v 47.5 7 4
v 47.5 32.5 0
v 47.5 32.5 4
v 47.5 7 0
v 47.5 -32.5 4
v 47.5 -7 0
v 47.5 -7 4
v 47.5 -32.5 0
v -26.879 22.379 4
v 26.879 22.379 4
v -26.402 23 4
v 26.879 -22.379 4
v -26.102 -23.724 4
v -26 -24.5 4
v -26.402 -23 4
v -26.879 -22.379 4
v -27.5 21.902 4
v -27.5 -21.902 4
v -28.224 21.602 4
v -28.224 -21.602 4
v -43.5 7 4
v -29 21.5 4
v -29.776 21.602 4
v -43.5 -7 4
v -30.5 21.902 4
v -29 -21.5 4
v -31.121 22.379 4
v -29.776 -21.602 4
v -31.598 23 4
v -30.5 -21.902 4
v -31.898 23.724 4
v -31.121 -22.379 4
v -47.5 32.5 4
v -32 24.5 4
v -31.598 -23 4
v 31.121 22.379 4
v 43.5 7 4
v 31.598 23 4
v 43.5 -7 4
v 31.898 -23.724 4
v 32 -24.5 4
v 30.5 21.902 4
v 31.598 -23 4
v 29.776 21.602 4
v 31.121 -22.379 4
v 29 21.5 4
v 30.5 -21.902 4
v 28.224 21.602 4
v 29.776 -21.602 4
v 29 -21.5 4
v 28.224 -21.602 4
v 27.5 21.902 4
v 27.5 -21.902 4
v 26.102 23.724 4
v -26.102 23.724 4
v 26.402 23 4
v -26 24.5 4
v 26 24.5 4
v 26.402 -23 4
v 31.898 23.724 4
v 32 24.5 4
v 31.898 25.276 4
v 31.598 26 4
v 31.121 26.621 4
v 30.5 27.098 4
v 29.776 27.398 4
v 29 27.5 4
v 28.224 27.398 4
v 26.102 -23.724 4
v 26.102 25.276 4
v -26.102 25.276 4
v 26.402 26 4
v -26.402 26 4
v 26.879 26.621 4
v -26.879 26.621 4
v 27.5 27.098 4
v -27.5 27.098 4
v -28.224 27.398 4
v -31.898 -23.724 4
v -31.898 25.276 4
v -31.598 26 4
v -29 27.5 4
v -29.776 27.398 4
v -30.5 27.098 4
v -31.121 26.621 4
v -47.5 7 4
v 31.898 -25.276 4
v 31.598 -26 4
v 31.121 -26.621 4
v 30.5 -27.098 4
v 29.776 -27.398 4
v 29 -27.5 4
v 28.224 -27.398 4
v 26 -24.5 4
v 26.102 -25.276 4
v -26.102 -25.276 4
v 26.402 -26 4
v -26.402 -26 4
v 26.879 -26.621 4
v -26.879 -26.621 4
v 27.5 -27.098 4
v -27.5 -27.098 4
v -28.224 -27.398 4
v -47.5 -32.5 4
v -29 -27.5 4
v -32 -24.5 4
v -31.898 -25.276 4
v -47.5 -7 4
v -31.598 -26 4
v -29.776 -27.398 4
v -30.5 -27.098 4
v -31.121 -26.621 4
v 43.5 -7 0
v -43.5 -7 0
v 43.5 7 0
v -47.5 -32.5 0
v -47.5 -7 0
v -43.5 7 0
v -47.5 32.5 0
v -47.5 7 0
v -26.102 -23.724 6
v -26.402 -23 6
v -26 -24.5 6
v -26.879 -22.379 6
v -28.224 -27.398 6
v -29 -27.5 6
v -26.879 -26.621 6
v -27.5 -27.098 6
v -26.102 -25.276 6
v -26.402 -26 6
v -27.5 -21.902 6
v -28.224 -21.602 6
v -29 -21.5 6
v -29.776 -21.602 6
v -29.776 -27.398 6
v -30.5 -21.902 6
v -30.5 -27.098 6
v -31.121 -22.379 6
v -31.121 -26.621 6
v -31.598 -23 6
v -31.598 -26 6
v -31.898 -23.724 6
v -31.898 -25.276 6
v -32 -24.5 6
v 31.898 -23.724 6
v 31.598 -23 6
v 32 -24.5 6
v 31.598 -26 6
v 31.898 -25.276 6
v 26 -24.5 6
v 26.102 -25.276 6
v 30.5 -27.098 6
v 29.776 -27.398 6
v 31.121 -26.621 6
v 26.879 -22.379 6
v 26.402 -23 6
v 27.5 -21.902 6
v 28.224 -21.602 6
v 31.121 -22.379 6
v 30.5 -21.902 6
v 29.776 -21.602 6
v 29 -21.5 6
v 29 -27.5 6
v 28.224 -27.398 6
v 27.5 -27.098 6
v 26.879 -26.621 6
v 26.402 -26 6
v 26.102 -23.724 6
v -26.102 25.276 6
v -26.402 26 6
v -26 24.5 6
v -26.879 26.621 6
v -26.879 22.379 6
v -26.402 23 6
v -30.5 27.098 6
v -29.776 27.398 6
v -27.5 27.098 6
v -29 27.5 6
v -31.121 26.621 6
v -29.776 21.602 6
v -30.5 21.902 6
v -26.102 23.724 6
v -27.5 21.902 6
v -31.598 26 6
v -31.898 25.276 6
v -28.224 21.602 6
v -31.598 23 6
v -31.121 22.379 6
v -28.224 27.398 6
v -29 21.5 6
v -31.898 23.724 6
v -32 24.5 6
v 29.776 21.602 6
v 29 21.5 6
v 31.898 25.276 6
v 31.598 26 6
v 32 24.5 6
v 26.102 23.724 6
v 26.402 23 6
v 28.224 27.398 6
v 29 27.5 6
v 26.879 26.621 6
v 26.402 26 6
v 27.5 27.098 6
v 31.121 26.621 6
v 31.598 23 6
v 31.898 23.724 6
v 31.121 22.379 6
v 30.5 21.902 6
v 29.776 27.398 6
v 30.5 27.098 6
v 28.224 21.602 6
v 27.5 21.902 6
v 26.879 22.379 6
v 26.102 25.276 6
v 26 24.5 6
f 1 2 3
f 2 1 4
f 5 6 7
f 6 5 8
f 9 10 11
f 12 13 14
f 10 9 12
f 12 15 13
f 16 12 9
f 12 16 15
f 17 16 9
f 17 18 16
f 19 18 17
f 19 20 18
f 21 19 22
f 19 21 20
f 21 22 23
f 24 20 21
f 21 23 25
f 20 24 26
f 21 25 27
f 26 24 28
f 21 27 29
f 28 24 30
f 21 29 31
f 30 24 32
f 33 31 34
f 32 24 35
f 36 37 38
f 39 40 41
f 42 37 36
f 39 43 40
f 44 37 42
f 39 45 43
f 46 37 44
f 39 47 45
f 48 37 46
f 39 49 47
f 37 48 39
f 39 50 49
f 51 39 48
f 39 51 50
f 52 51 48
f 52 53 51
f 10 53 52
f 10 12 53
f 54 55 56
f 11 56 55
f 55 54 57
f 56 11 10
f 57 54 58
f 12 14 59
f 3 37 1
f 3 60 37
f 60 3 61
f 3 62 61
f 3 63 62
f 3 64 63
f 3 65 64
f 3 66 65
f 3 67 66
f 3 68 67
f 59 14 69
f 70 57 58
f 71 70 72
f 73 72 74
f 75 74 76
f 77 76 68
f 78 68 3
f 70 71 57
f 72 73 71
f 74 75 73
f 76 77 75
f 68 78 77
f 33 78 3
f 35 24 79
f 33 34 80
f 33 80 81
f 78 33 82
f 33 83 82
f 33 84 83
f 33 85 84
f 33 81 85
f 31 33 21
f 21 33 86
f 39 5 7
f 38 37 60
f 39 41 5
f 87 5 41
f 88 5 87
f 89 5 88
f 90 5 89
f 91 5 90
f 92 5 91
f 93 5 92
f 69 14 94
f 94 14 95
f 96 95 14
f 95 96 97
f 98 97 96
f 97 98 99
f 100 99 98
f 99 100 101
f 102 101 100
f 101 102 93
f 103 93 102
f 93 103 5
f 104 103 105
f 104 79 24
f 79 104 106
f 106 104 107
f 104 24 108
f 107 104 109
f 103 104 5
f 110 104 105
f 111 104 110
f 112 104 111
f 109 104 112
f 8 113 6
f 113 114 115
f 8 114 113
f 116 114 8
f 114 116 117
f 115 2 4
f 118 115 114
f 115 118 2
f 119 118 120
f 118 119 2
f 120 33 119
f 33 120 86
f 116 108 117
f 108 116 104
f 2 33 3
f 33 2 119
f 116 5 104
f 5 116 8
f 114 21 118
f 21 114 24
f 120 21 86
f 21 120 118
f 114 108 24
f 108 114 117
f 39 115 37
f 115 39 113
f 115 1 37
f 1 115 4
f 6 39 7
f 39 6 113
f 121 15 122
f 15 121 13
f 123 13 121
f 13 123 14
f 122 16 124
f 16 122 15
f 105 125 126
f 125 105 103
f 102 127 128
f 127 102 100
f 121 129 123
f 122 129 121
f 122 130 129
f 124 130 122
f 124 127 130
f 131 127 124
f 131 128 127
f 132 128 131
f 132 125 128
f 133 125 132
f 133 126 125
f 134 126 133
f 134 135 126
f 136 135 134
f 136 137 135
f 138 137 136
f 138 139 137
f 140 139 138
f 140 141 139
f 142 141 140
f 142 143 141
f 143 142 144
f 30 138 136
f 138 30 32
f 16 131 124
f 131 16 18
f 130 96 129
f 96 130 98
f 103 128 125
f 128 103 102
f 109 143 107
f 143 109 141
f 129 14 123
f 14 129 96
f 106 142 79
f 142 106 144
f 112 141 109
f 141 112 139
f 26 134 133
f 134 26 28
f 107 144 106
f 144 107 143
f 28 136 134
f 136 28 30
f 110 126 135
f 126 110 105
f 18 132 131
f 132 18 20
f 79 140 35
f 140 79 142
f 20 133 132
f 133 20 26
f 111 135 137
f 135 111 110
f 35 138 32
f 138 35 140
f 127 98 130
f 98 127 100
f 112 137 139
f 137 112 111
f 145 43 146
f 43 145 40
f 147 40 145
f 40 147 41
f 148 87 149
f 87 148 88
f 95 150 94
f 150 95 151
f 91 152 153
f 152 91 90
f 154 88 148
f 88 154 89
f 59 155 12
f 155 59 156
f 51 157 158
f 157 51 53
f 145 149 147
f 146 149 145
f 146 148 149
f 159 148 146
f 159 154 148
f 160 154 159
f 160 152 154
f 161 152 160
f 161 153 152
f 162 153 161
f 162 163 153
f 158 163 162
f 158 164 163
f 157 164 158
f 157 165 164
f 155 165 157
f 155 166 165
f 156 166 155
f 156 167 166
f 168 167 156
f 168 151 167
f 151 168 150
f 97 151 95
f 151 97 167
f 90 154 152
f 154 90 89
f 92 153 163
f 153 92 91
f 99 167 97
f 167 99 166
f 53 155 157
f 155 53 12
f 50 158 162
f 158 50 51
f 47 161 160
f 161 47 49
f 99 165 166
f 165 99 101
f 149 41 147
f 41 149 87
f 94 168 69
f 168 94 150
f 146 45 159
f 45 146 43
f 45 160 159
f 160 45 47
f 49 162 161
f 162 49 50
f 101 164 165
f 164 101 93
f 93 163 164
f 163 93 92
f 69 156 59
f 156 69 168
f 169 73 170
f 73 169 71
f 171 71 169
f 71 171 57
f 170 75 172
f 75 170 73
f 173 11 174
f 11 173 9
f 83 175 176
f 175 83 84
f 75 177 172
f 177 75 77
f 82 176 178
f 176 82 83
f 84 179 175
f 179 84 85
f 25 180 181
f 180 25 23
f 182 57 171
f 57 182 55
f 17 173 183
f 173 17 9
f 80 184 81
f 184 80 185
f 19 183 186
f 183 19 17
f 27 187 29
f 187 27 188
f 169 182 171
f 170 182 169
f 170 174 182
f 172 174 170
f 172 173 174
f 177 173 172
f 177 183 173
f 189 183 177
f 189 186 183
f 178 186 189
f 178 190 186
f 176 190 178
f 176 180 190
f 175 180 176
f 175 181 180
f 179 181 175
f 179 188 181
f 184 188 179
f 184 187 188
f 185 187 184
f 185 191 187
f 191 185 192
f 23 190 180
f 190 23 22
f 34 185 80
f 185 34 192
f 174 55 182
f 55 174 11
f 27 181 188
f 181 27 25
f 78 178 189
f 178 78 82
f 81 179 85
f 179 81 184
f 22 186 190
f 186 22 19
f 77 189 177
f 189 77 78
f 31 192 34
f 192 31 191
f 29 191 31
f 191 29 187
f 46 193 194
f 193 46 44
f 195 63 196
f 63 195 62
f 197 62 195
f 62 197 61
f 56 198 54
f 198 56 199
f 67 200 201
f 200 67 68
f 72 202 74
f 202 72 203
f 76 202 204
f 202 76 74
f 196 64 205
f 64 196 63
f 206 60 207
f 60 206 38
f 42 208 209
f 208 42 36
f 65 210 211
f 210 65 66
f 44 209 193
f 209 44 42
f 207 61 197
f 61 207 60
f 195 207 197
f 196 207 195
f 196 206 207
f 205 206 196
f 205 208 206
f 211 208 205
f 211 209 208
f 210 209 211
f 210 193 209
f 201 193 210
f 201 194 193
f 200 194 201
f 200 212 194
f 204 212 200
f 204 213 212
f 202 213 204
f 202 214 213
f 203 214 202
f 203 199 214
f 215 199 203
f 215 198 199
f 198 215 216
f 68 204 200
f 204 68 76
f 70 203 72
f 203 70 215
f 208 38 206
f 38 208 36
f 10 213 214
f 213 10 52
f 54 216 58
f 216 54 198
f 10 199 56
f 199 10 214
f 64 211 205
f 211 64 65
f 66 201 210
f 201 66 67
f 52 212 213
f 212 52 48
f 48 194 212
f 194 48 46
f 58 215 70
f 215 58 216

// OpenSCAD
$fn = 24;

module base_plate() {
    cube([95, 65, 4], center=true);
}

module standoff(height) {
    cylinder(h=height, r=3, center=false);
}

module clearance_hole() {
    cylinder(h=10, r=1.35, center=false);
}

module keyhole_slot() {
    // 8mm wide x 14mm long slot
    cube([8, 14, 5], center=true);
}

// Calculate mounting hole positions (centered on 58mm x 49mm pattern)
// Offset from board center (85x56) to match Pi 5 spec
hole_x_offset = 58 / 2;
hole_y_offset = 49 / 2;

difference() {
    // Base plate
    translate([0, 0, 2]) base_plate();
    
    // Four standoff mounting holes (M2.5 = 2.7mm clearance)
    // Front-left
    translate([-hole_x_offset, -hole_y_offset, 0]) 
        clearance_hole();
    
    // Front-right
    translate([hole_x_offset, -hole_y_offset, 0]) 
        clearance_hole();
    
    // Back-left
    translate([-hole_x_offset, hole_y_offset, 0]) 
        clearance_hole();
    
    // Back-right
    translate([hole_x_offset, hole_y_offset, 0]) 
        clearance_hole();
    
    // Two keyhole slots on short edges (65mm side)
    // Left edge keyhole
    translate([-47.5, 0, 2]) 
        keyhole_slot();
    
    // Right edge keyhole
    translate([47.5, 0, 2]) 
        keyhole_slot();
}

// Add four standoffs (positive geometry)
translate([-hole_x_offset, -hole_y_offset, 0]) 
    standoff(6);

translate([hole_x_offset, -hole_y_offset, 0]) 
    standoff(6);

translate([-hole_x_offset, hole_y_offset, 0]) 
    standoff(6);

translate([hole_x_offset, hole_y_offset, 0]) 
    standoff(6);
